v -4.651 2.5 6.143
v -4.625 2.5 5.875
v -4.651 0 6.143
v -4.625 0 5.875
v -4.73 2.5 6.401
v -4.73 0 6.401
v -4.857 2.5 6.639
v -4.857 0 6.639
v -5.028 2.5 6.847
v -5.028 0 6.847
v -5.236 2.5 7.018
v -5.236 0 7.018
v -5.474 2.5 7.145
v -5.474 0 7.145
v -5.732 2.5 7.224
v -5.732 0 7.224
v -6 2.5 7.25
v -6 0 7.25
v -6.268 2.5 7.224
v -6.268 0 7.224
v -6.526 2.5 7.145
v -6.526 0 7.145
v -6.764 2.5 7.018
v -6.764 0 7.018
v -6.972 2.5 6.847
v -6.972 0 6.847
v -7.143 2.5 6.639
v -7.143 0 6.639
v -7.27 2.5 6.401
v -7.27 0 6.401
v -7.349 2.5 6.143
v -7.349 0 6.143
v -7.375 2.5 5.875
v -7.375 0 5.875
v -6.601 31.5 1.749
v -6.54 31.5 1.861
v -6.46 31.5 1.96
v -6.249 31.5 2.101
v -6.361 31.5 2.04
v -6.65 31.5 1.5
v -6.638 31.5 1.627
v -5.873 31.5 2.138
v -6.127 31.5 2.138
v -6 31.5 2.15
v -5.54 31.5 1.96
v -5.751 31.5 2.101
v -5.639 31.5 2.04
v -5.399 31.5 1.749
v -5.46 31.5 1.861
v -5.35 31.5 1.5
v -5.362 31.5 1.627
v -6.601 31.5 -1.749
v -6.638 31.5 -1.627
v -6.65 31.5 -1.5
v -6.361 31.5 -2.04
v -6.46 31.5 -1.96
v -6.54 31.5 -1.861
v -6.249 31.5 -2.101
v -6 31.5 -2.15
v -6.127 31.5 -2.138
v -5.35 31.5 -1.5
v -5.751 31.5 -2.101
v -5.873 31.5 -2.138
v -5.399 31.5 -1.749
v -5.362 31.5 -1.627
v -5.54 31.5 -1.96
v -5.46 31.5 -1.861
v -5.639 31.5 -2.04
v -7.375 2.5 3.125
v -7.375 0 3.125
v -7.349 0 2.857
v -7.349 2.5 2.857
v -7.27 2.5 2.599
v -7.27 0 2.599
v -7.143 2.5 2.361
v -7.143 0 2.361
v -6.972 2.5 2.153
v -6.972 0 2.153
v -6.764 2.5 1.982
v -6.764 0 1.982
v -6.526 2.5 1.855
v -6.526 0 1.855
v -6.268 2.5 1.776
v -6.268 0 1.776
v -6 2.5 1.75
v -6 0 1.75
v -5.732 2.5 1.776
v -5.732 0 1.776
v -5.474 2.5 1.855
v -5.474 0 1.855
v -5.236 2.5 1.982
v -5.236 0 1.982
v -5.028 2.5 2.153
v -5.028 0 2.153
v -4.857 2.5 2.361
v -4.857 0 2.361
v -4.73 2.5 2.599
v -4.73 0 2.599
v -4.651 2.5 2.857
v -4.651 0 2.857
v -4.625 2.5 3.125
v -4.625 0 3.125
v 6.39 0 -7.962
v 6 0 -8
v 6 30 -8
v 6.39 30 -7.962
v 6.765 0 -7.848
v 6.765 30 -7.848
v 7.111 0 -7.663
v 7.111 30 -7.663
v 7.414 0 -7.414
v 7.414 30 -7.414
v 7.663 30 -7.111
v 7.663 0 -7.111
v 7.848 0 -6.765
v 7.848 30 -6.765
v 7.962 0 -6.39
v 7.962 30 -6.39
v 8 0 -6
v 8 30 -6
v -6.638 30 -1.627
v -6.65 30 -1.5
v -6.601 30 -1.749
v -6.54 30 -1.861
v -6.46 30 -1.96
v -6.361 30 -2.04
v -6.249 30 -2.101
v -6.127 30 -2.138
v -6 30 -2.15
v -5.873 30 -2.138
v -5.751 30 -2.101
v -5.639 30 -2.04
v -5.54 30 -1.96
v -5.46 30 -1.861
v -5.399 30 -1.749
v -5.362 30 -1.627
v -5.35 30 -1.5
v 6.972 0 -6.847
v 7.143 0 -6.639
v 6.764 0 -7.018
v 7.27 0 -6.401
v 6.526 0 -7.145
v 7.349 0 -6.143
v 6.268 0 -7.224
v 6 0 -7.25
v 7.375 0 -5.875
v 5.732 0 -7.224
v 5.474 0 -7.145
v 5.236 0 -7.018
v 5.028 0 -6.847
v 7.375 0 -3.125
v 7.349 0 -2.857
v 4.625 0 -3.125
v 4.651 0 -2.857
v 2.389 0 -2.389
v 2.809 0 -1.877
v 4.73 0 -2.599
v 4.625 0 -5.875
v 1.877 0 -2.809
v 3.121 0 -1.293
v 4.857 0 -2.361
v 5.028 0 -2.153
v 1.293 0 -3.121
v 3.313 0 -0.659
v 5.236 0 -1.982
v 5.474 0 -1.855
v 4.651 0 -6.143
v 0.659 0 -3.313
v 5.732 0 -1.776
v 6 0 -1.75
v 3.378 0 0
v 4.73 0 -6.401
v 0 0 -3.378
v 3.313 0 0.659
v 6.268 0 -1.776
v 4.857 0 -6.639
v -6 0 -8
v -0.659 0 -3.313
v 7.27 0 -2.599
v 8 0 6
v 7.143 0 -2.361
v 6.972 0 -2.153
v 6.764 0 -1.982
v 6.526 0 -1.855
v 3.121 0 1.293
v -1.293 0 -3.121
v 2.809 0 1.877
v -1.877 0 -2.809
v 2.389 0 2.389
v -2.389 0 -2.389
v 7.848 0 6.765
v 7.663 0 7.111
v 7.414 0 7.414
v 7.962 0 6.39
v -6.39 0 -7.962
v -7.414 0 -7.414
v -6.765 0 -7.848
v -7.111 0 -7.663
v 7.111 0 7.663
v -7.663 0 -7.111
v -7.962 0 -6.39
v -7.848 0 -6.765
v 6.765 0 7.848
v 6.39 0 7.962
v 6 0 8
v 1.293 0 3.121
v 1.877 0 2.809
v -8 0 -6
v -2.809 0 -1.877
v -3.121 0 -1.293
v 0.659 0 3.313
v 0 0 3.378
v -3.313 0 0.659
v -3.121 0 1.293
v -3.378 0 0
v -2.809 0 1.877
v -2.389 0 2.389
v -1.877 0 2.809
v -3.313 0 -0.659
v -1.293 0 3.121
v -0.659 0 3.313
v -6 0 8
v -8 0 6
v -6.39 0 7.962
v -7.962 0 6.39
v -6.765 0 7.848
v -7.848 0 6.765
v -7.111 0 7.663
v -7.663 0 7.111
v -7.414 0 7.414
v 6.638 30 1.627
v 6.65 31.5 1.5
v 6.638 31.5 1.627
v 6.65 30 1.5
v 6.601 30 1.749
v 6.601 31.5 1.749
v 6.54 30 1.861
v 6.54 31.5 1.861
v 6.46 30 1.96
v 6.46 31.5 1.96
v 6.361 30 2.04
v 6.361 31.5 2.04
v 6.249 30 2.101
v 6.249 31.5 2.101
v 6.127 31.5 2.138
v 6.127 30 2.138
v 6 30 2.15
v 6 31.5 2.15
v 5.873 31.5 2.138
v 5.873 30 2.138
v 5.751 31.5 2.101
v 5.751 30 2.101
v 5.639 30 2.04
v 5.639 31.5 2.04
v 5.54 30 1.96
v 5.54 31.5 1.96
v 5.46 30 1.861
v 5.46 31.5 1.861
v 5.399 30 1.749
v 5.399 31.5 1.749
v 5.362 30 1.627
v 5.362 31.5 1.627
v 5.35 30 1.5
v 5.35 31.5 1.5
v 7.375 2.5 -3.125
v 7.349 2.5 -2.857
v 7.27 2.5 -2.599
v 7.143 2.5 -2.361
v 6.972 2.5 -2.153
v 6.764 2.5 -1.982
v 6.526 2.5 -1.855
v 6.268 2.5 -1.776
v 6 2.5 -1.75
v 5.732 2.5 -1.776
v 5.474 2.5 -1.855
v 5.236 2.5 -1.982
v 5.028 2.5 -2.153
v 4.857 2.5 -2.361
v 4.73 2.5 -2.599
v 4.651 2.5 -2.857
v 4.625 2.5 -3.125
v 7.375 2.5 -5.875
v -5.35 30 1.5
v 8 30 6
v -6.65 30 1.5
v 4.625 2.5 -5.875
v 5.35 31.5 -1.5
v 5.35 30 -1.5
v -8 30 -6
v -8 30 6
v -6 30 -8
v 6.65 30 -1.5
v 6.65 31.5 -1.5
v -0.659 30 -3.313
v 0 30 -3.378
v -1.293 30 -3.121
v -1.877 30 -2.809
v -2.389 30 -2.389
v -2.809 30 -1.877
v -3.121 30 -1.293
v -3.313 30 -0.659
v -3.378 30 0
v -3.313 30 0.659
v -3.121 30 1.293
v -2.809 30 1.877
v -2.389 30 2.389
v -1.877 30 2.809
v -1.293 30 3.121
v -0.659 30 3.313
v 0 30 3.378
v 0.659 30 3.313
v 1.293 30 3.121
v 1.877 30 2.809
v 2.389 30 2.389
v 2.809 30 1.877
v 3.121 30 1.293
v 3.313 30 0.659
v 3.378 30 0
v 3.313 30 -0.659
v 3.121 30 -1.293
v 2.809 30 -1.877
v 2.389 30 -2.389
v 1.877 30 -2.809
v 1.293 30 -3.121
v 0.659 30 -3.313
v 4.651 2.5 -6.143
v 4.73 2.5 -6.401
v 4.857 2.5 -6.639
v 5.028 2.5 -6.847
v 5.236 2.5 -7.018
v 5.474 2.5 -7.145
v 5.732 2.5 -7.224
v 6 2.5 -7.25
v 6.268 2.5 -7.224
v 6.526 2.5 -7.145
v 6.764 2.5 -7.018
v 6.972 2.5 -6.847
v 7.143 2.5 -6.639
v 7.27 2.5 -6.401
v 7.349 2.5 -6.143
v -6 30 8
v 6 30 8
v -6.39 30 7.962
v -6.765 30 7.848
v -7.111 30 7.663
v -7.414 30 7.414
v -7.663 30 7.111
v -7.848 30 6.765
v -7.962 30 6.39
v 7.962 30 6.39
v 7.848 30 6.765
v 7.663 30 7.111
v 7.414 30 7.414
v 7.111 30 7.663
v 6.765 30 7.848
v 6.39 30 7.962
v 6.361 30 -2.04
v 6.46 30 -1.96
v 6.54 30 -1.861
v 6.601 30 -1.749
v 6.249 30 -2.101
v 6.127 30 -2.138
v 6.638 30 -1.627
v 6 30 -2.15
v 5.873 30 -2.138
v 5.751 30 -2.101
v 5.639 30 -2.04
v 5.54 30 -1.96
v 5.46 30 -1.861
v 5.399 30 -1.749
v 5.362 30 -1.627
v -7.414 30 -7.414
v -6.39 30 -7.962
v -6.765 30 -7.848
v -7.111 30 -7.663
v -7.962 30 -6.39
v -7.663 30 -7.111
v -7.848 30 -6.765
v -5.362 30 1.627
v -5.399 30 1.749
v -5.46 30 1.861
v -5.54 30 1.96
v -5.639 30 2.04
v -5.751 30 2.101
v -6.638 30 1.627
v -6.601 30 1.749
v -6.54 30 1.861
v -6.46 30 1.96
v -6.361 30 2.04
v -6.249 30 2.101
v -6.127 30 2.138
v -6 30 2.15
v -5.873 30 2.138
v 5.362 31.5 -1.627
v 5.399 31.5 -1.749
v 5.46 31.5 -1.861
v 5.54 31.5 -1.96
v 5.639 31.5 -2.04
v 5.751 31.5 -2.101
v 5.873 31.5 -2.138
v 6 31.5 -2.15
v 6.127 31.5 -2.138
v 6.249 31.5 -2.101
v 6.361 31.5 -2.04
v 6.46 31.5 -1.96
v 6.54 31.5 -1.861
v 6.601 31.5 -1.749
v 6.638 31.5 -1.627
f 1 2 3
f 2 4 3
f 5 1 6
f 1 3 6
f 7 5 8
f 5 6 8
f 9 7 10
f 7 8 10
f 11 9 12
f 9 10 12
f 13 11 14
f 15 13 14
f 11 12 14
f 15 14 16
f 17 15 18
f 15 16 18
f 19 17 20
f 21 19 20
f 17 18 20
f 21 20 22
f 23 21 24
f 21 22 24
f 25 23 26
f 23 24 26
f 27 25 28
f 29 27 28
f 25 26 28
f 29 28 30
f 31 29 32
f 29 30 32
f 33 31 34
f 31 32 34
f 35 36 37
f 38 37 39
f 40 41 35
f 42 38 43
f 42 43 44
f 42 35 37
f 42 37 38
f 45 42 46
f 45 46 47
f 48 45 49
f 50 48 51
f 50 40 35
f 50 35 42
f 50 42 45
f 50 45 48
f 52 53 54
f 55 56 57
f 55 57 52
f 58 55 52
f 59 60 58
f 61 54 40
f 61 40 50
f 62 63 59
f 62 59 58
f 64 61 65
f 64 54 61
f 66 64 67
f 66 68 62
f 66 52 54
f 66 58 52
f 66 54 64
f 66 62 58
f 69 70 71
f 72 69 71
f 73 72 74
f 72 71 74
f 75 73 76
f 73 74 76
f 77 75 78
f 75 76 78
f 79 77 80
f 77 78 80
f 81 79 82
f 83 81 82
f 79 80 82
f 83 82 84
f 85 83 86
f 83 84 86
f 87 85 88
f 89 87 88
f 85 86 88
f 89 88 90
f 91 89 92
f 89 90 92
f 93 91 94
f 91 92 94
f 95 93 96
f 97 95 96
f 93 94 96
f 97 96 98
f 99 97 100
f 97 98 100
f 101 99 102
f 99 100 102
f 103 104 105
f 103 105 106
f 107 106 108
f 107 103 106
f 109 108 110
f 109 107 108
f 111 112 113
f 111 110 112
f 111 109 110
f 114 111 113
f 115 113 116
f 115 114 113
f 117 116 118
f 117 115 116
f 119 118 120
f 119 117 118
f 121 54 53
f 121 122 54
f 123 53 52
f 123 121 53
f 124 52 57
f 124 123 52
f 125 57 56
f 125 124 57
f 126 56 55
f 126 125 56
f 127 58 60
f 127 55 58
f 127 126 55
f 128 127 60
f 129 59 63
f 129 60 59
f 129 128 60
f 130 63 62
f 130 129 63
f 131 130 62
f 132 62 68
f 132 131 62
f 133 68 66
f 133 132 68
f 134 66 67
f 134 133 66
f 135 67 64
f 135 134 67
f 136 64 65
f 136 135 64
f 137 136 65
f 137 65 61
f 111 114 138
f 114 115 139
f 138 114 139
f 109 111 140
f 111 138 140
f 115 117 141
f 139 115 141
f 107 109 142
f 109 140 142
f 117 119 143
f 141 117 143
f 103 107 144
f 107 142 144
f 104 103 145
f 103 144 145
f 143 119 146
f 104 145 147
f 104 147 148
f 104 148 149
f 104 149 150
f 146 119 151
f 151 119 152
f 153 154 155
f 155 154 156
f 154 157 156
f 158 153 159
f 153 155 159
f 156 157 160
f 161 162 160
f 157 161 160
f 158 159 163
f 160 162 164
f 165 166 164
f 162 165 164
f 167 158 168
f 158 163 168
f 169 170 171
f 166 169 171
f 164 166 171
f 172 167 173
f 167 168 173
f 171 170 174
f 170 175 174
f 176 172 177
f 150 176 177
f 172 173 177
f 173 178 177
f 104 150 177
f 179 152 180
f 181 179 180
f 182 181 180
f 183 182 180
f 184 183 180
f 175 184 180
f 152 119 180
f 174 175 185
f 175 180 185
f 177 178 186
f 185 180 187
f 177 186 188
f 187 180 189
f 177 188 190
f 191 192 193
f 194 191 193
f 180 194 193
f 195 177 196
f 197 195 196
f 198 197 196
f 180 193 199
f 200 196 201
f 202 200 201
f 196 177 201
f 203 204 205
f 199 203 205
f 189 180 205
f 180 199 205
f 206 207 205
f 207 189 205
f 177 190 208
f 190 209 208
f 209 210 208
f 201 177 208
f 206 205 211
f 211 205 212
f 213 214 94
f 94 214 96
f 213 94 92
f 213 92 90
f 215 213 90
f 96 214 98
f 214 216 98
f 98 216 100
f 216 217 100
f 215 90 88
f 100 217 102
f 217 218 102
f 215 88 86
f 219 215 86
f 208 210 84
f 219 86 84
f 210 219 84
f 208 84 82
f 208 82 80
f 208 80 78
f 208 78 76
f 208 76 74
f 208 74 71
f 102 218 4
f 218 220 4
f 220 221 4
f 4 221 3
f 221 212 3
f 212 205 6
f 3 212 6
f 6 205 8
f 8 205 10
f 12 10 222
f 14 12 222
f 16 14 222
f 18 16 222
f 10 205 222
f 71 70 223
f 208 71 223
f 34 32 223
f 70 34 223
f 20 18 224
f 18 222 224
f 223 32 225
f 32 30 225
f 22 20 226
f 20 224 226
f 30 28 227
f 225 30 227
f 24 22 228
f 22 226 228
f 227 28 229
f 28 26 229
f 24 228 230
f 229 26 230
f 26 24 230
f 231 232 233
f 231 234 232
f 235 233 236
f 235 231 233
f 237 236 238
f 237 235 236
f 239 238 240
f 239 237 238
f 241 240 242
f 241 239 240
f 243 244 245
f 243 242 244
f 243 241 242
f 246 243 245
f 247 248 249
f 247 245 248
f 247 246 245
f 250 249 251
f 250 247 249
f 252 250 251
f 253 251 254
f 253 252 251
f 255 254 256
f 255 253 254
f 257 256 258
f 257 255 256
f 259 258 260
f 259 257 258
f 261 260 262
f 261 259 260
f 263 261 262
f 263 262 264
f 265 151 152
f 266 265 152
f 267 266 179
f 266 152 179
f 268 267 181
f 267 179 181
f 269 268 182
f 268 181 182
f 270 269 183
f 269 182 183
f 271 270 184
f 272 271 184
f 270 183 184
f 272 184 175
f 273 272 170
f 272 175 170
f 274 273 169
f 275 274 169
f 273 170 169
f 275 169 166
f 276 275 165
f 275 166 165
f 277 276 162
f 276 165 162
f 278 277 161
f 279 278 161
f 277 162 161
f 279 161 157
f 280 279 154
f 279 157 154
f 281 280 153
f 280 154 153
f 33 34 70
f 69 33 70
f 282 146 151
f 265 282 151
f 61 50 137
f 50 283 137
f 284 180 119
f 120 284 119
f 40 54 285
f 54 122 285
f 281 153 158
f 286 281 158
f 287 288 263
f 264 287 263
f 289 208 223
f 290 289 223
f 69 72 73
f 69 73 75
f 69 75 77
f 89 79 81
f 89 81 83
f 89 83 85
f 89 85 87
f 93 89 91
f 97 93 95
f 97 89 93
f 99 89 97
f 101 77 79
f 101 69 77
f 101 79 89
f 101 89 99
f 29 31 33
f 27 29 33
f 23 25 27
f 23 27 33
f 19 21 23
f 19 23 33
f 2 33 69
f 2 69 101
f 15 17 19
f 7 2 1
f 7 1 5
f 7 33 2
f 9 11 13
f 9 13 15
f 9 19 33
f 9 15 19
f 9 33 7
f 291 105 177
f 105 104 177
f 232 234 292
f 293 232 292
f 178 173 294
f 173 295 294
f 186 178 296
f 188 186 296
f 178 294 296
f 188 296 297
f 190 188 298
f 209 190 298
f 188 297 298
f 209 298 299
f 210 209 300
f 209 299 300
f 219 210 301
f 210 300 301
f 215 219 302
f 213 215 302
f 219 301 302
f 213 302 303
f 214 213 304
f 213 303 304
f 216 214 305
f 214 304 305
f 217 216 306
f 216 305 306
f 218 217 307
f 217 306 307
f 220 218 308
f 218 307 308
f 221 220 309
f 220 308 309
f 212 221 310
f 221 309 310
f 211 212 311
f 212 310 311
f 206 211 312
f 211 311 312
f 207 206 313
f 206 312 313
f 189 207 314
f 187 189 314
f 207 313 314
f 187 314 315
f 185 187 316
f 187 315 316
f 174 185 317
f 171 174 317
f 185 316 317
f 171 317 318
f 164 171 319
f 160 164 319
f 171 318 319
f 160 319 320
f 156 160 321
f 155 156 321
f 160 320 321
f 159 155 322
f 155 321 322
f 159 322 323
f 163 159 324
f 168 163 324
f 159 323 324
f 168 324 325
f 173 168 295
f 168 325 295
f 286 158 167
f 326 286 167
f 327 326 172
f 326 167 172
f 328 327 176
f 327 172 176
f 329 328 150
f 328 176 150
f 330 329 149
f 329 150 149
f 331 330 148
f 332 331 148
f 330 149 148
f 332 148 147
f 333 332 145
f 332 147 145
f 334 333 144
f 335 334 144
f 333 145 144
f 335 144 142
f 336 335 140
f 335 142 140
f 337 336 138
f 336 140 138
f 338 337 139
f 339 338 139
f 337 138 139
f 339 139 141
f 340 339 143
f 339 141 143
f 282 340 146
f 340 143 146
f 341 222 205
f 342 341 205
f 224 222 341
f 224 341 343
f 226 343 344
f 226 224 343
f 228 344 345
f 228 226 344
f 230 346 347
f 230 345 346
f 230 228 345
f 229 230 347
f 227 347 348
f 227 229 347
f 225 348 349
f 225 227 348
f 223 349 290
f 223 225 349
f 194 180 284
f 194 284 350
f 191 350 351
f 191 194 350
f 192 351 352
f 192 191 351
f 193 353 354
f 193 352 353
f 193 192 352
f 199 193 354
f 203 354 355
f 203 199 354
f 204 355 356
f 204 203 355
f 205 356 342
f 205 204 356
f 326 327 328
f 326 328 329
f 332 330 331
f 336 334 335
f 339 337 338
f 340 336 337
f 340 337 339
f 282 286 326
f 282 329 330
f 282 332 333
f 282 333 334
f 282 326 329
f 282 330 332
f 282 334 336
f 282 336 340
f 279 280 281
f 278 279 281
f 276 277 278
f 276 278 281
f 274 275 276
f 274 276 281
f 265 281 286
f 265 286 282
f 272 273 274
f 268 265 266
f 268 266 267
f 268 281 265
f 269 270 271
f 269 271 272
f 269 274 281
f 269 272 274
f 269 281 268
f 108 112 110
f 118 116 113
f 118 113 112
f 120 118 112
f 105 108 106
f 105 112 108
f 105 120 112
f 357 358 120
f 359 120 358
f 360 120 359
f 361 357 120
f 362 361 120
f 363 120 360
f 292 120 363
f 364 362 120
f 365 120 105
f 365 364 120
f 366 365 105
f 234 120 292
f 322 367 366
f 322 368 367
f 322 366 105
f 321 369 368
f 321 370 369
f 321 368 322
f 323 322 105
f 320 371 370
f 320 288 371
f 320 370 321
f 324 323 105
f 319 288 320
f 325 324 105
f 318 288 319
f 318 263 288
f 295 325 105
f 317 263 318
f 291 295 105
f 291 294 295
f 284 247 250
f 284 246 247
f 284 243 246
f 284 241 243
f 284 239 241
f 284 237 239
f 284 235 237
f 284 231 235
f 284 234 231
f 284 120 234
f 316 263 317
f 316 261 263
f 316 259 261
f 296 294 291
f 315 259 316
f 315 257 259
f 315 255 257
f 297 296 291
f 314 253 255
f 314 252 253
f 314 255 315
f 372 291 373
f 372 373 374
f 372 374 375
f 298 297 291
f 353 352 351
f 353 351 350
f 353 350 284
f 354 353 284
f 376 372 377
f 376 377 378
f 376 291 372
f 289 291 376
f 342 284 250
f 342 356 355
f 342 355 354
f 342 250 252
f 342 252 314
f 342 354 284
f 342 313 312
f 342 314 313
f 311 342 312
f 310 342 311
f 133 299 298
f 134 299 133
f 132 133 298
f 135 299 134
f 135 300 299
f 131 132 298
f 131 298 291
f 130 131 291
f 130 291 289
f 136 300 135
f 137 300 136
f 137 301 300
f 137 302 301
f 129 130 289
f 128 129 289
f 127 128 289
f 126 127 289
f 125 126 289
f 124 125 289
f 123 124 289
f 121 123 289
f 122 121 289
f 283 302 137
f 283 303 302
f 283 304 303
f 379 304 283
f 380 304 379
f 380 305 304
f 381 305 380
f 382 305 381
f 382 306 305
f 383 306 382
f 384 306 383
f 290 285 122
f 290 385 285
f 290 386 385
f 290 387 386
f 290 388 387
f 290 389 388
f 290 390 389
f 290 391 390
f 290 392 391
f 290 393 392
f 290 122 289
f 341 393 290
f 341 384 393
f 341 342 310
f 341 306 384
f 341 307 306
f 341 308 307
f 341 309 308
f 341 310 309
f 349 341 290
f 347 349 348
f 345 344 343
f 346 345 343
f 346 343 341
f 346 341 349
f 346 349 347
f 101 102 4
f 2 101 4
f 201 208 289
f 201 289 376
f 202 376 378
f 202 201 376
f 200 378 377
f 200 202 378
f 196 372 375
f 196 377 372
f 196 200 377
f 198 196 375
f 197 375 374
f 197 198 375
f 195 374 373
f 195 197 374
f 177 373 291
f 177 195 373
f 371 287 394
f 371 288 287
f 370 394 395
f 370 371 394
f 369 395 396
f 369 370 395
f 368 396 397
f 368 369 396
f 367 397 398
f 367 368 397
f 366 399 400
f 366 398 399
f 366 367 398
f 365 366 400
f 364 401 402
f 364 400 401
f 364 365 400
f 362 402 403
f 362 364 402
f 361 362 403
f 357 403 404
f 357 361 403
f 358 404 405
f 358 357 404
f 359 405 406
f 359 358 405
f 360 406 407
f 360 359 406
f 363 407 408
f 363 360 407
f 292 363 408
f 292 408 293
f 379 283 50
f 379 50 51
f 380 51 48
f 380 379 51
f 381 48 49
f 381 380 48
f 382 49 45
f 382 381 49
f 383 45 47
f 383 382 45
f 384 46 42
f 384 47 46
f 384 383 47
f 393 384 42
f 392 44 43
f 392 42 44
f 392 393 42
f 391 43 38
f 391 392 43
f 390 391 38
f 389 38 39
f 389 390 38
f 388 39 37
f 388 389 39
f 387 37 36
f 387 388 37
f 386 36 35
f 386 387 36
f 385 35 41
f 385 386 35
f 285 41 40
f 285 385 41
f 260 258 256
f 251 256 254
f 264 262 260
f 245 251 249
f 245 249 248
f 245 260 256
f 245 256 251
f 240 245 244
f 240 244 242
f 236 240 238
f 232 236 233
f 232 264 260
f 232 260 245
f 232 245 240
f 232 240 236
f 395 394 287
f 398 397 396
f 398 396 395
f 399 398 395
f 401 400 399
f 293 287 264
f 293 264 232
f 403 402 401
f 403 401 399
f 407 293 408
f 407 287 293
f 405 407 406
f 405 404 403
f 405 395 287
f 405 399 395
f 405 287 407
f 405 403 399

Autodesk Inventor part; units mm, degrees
ref_plane "YZ Plane" through (0, 0, 0) normal (1, 0, 0) x (0, 1, 0)
ref_plane "XZ Plane" through (0, 0, 0) normal (0, 1, 0) x (-1, 0, 0)
ref_plane "XY Plane" through (0, 0, 0) normal (0, 0, 1) x (1, 0, 0)
sketch "Sketch1" plane through (0, 0, 0) normal (0, 1, 0) x (-1, 0, 0)
  line L0 (6, 8) -> (-6, 8)
  line L1 (-8, 6) -> (-8, -6)
  line L2 (-6, -8) -> (6, -8)
  line L3 (8, -6) -> (8, 6)
  arc A0 (8, 6) -> (6, 8) centre (6, 6) ccw
  arc A1 (-6, 8) -> (-8, 6) centre (-6, 6) ccw
  arc A2 (-8, -6) -> (-6, -8) centre (-6, -6) ccw
  arc A3 (6, -8) -> (8, -6) centre (6, -6) ccw
  point P0 (0, 0)
  point P1 (8, 8)
  point P2 (-8, 8)
  point P3 (8, -8)
  dimension "d0" = 16
  dimension "d1" = 16
  dimension "d2" = 8
  dimension "d3" = 8
  dimension "d4" = 2
extrude "Extrusion1" add sketch "Sketch1" along normal blind 30
sketch "Sketch2" plane through (0, 0, 0) normal (0, -1, 0) x (1, 0, 0)
  line L0 (-6, 5.875) -> (-6, 3.125) construction
  line L1 (-7.375, 5.875) -> (-7.375, 3.125)
  line L2 (-4.625, 3.125) -> (-4.625, 5.875)
  arc A0 (-4.625, 5.875) -> (-7.375, 5.875) centre (-6, 5.875) ccw
  arc A1 (-7.375, 3.125) -> (-4.625, 3.125) centre (-6, 3.125) ccw
  line L3 (6, -3.125) -> (6, -5.875) construction
  line L4 (4.625, -3.125) -> (4.625, -5.875)
  line L5 (7.375, -5.875) -> (7.375, -3.125)
  arc A2 (7.375, -3.125) -> (4.625, -3.125) centre (6, -3.125) ccw
  arc A3 (4.625, -5.875) -> (7.375, -5.875) centre (6, -5.875) ccw
  point P0 (0, 0)
  point P1 (0, 0)
  point P2 (-6, 4.5)
  point P3 (6, -4.5)
  dimension "d7" = 2.75
  dimension "d8" = 12
  dimension "d9" = 6
  dimension "d10" = 9
  dimension "d11" = 4.5
  dimension "d12" = 2.75
  dimension "d13" = 2.75
  dimension "d14" = 2.75
extrude "Extrusion2" cut sketch "Sketch2" against normal blind 2.5
hole "Hole1" at (0, 0, 0) direction (0, 1, 0) diameter 6.756 end through all clearance for "Flat Head Machine Screw (82)" size "1/4" standard "Ansi Unified Screw Threads"
sketch "Sketch3" plane through (0, 30, 0) normal (0, 1, 0) x (1, 0, 0)
  line L0 (-6, 1.5) -> (-6, -1.5) construction
  line L1 (-6.65, 1.5) -> (-6.65, -1.5)
  line L2 (-5.35, -1.5) -> (-5.35, 1.5)
  arc A0 (-5.35, 1.5) -> (-6.65, 1.5) centre (-6, 1.5) ccw
  arc A1 (-6.65, -1.5) -> (-5.35, -1.5) centre (-6, -1.5) ccw
  line L3 (6, 1.5) -> (6, -1.5) construction
  line L4 (5.35, 1.5) -> (5.35, -1.5)
  line L5 (6.65, -1.5) -> (6.65, 1.5)
  arc A2 (6.65, 1.5) -> (5.35, 1.5) centre (6, 1.5) ccw
  arc A3 (5.35, -1.5) -> (6.65, -1.5) centre (6, -1.5) ccw
  line L6 (-6, 0) -> (6, 0) construction
  line L7 (6, 8) -> (-6, 8) projected
  point P0 (0, 0)
  dimension "d25" = 0.65
  dimension "d26" = 0.65
  dimension "d27" = 3
  dimension "d29" = 0
  dimension "d30" = 12
  dimension "d31" = 6
  dimension "d32" = 3
extrude "Extrusion3" add sketch "Sketch3" along normal blind 1.5
equation "\"d1\" = d0"
equation "\"d2\" = 0.5 * d0"
equation "\"d3\" = d2"
equation "\"d9\" = 0.5 * d8"
equation "\"d11\" = 0.5 * d10"
equation "\"d12\" = d7"
equation "\"d13\" = d7"
equation "\"d14\" = d7"
equation "\"d26\" = d25"
equation "\"d27\" = d32"
equation "\"d31\" = 0.5 * d30"
properties part number "Camera Mount 30mm"
